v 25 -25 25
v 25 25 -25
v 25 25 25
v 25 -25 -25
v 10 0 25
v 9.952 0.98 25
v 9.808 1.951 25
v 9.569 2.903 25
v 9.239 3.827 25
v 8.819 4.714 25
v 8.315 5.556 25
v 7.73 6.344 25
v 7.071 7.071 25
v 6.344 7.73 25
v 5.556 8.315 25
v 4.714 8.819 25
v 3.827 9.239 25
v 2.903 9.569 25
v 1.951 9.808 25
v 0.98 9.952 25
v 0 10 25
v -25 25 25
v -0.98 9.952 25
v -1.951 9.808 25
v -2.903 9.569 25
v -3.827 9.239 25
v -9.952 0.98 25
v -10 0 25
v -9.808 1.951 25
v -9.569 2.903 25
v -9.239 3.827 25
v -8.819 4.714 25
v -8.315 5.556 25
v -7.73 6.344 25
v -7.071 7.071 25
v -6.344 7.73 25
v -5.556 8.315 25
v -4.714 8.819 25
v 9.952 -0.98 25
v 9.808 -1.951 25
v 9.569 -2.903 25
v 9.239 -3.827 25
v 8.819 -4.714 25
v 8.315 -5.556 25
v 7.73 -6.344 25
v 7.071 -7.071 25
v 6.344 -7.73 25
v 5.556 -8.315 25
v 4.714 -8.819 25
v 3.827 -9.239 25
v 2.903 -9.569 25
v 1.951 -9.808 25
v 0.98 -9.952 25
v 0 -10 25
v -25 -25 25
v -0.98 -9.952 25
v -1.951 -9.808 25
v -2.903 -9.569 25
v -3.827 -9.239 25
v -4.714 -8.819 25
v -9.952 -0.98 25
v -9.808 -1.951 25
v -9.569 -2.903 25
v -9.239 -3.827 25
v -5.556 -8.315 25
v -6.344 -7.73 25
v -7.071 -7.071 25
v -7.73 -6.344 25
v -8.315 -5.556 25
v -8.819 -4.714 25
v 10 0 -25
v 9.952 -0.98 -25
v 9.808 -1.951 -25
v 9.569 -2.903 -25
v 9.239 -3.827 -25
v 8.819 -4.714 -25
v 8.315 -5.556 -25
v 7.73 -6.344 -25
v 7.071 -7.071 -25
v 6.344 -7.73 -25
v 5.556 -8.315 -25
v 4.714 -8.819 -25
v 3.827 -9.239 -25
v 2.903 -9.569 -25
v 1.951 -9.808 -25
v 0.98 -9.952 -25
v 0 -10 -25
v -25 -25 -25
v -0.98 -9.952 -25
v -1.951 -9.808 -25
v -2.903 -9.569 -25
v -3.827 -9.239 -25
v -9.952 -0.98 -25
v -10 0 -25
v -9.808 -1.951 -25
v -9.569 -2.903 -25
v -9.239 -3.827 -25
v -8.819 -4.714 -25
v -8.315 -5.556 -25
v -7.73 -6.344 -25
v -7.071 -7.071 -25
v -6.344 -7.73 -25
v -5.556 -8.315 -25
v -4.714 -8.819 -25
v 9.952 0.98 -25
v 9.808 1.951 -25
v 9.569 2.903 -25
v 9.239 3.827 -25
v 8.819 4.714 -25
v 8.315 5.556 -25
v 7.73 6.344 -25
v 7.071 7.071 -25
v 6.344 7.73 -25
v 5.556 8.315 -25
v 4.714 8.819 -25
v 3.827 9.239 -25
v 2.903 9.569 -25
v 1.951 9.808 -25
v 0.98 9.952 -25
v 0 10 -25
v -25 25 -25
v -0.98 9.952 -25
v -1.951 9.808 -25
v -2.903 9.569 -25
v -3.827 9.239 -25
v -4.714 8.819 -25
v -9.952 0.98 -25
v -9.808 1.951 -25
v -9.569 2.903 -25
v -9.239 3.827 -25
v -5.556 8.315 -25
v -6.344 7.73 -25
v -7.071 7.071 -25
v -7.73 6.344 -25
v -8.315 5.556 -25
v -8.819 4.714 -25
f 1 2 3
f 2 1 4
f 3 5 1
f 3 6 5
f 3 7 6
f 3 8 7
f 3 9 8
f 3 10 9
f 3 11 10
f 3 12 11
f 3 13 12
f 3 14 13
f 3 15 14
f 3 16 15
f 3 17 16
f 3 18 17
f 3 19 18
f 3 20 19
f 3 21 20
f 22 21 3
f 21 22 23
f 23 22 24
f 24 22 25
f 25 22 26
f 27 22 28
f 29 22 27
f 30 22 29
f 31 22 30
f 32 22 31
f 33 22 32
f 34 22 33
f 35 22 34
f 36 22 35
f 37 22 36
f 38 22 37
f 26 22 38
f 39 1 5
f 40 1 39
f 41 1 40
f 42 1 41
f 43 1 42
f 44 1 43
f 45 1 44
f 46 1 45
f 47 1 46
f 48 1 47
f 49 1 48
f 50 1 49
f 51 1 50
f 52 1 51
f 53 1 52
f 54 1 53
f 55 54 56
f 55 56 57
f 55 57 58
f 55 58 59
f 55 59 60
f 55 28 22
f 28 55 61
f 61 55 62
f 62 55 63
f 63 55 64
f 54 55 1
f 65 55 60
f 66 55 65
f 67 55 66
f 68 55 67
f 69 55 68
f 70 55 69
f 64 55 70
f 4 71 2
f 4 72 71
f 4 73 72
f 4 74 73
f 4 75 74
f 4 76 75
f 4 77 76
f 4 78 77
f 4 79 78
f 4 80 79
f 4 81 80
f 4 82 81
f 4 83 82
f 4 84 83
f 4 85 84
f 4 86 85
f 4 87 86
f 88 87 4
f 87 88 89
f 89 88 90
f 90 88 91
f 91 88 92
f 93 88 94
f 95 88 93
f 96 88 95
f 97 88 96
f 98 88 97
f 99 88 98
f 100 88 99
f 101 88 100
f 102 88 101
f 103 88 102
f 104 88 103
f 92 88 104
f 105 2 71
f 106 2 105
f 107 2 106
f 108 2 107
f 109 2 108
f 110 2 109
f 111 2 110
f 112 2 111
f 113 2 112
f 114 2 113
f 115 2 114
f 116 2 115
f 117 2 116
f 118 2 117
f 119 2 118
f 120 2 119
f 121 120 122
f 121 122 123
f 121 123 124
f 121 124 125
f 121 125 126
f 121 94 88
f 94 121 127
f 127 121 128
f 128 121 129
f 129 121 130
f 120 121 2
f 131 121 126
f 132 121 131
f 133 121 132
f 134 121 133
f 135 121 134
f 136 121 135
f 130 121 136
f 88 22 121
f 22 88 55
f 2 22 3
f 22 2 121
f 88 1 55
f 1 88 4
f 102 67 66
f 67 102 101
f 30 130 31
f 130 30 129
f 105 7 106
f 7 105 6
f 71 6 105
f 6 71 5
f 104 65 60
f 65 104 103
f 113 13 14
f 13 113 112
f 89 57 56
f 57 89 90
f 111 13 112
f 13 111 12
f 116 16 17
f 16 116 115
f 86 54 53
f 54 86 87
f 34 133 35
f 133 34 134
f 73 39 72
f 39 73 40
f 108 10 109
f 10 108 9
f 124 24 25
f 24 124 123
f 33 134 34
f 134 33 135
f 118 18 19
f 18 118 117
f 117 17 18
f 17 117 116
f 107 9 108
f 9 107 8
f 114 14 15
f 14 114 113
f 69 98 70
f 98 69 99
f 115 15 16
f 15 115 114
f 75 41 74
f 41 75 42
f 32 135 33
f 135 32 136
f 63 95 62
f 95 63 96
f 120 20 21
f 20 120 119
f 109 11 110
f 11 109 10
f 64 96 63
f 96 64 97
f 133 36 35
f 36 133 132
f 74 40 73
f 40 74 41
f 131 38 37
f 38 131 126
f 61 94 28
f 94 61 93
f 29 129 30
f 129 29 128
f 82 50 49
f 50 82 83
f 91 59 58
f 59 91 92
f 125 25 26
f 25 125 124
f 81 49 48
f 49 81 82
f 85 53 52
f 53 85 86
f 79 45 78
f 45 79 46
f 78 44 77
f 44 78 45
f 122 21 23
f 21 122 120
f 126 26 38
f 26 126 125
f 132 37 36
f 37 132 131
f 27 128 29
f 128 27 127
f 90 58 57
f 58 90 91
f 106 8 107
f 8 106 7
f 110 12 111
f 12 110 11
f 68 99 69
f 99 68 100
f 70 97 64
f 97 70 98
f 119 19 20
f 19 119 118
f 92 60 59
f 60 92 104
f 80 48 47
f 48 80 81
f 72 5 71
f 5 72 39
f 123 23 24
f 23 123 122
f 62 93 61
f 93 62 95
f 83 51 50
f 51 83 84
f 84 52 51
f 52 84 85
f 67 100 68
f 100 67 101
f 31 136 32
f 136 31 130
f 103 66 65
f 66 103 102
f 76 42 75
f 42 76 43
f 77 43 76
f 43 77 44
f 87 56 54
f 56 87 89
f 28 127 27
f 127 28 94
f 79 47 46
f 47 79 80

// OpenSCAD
difference() {
    // 50 mm × 50 mm × 50 mm cube centered at the origin
    cube([50, 50, 50], center = true);

    // 20 mm diameter cylindrical hole drilled along the Z‑axis,
    // extended slightly beyond the cube for clean subtraction.
    cylinder(d = 20, h = 51, $fn = 64, center = true);
}
